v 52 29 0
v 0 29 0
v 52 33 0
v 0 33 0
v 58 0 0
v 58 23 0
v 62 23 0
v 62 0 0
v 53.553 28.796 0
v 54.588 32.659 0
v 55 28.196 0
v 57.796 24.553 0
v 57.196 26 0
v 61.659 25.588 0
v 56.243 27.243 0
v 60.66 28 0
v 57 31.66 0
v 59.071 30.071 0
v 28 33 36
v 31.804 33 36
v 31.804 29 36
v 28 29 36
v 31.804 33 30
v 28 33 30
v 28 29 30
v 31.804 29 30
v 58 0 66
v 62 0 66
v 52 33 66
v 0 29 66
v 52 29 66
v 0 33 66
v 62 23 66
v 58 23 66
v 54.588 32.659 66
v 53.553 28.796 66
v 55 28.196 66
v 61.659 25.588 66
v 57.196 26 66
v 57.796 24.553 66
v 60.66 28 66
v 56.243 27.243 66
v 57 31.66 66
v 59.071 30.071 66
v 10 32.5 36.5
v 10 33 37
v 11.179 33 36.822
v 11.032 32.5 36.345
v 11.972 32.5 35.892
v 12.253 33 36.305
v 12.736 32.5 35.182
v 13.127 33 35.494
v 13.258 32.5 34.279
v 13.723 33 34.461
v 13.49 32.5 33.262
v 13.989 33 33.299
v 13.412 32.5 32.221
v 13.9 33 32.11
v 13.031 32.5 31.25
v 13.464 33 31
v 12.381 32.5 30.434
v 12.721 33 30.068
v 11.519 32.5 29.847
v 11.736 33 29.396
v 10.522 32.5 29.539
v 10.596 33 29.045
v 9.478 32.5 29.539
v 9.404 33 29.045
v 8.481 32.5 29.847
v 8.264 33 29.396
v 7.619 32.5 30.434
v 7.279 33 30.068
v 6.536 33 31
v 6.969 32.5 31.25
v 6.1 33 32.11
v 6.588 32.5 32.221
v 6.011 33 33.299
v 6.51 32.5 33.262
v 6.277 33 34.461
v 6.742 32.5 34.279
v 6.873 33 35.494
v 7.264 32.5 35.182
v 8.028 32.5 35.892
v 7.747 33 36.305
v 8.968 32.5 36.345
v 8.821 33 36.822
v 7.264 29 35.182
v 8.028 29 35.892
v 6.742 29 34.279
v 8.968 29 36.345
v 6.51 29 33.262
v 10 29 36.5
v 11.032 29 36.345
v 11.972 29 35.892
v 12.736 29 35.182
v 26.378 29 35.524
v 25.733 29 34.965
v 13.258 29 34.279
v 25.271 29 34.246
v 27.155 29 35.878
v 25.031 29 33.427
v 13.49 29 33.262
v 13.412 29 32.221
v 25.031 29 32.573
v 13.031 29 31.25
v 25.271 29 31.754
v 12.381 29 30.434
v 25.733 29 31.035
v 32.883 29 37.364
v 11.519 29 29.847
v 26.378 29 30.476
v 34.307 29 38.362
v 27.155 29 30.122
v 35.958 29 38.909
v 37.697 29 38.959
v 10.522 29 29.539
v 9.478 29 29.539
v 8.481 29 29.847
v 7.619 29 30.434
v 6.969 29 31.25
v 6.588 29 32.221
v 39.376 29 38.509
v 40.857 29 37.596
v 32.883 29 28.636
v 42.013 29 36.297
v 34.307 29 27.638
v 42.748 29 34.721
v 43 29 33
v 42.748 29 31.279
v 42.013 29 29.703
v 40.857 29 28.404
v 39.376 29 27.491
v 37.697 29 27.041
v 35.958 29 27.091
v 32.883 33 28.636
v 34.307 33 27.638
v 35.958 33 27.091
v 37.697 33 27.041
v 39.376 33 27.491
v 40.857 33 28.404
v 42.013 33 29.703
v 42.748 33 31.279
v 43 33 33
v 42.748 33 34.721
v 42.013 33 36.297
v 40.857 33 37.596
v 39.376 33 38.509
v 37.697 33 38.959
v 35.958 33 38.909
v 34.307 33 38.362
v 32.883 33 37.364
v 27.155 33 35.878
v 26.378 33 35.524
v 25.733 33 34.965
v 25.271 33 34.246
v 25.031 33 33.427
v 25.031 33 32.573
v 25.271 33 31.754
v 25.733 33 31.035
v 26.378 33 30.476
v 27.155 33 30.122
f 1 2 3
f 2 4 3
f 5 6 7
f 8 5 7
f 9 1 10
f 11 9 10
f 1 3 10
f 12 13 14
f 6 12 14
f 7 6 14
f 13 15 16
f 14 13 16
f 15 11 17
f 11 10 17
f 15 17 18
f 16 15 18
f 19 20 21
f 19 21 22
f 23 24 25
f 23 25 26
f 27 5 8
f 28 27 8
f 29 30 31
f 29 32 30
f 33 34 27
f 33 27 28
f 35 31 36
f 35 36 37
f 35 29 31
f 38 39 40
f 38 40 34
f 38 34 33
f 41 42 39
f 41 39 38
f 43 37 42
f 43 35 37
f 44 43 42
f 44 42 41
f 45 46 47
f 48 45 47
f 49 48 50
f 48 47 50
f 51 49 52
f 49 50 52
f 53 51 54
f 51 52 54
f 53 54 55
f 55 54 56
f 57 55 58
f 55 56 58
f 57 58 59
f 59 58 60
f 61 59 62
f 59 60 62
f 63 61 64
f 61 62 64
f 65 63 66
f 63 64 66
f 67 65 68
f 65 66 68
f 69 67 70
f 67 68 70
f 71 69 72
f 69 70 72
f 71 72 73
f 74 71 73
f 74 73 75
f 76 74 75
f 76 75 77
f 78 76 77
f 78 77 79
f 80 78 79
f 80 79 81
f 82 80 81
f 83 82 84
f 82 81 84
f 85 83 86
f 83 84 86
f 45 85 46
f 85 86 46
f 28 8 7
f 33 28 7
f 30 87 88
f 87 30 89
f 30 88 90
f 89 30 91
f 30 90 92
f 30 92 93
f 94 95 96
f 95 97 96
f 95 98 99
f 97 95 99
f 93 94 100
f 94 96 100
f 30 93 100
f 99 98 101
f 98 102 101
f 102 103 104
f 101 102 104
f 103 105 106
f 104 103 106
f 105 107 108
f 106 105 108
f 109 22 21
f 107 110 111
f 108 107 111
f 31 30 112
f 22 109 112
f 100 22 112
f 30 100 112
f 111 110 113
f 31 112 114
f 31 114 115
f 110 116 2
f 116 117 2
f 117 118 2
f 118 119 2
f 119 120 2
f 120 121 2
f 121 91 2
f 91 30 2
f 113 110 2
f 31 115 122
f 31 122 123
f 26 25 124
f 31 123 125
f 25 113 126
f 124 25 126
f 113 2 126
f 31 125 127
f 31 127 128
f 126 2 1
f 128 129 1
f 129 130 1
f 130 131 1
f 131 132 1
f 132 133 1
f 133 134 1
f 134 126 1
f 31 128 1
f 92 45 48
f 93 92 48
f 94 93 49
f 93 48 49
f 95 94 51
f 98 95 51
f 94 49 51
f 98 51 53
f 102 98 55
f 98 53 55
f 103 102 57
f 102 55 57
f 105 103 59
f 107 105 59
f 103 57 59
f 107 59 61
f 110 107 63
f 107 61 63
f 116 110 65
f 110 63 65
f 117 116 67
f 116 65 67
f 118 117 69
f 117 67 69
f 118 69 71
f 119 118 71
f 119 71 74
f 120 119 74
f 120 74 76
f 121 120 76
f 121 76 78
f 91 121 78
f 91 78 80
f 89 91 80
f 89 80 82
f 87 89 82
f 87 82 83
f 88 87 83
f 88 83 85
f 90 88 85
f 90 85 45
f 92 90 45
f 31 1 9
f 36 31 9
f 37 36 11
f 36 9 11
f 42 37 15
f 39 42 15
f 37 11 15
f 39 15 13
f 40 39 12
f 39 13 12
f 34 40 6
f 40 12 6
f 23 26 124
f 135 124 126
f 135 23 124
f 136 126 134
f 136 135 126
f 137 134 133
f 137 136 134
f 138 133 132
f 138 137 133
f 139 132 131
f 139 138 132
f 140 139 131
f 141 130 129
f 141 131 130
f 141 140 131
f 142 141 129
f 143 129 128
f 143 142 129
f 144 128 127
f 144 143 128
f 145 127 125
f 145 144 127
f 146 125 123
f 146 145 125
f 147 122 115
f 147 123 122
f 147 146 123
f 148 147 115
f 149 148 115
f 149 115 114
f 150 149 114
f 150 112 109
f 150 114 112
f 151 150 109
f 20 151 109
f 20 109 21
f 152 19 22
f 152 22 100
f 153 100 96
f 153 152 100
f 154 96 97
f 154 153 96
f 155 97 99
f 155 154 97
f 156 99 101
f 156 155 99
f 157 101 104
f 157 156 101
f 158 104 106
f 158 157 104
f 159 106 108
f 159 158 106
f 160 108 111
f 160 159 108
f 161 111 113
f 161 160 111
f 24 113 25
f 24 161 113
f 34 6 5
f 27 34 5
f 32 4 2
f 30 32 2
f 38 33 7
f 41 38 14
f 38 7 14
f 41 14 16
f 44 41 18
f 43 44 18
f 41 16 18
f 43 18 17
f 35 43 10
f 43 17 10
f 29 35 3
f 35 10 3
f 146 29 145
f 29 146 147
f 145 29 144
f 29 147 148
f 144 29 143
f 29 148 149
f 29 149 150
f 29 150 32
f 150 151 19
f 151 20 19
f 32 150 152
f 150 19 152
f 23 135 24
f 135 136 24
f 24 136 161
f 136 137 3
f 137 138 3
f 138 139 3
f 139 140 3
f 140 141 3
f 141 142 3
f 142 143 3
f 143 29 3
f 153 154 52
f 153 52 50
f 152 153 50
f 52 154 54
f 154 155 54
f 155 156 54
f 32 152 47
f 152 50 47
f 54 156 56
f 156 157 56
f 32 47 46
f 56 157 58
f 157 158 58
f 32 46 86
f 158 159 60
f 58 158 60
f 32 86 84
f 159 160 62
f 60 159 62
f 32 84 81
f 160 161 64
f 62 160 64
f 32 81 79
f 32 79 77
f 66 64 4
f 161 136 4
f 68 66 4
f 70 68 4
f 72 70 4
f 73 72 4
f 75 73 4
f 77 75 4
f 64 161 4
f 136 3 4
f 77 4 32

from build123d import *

# Parameters (mm, degrees)
BOSS_EXTRUDE1_DEPTH = 66
CUT_EXTRUDE2_DEPTH  = 10
SKETCH3_R           = 3.5
CUT_EXTRUDE3_DEPTH  = 10
CHAMFER1_SIZE       = 0.5


with BuildPart() as part:
    # Sketch1 → Boss-Extrude1 (new body)
    with BuildSketch(Plane.XY):
        with BuildLine():
            Line((0, 29), (52, 29))
            ThreePointArc((52, 29), (56.242640687, 27.242640687), (58, 23))
            Line((58, 23), (58, 0))
            Line((58, 0), (62, 0))
            Line((62, 0), (62, 23))
            ThreePointArc((62, 23), (59.071067812, 30.071067812), (52, 33))
            Line((52, 33), (0, 33))
            Line((0, 33), (0, 29))
        make_face()
    extrude(amount=BOSS_EXTRUDE1_DEPTH)

    # Sketch2 → Cut-Extrude2 (cut)
    with BuildSketch(Plane(origin=(0, 33, 0), x_dir=(1, 0, 0), z_dir=(0, 1, 0))):
        with BuildLine():
            Line((28, -30), (31.803847577, -30))
            ThreePointArc((31.803847577, -30), (43, -33), (31.803847577, -36))
            Line((31.803847577, -36), (28, -36))
            ThreePointArc((28, -36), (25, -33), (28, -30))
        make_face()
    extrude(amount=-CUT_EXTRUDE2_DEPTH, mode=Mode.SUBTRACT)

    # Sketch3 → Cut-Extrude3 (cut)
    with BuildSketch(Plane(origin=(0, 33, 0), x_dir=(1, 0, 0), z_dir=(0, 1, 0))):
        with Locations(Location((10, -33, 0), (0, 0, 270))):
            Circle(SKETCH3_R)
    extrude(amount=-CUT_EXTRUDE3_DEPTH, mode=Mode.SUBTRACT)

    # Chamfer1
    chamfer1_edges = [part.edges().sort_by_distance(p)[0] for p in [
        (10, 33, 29.5),
    ]]
    chamfer(chamfer1_edges, length=CHAMFER1_SIZE)


solid = part.part
